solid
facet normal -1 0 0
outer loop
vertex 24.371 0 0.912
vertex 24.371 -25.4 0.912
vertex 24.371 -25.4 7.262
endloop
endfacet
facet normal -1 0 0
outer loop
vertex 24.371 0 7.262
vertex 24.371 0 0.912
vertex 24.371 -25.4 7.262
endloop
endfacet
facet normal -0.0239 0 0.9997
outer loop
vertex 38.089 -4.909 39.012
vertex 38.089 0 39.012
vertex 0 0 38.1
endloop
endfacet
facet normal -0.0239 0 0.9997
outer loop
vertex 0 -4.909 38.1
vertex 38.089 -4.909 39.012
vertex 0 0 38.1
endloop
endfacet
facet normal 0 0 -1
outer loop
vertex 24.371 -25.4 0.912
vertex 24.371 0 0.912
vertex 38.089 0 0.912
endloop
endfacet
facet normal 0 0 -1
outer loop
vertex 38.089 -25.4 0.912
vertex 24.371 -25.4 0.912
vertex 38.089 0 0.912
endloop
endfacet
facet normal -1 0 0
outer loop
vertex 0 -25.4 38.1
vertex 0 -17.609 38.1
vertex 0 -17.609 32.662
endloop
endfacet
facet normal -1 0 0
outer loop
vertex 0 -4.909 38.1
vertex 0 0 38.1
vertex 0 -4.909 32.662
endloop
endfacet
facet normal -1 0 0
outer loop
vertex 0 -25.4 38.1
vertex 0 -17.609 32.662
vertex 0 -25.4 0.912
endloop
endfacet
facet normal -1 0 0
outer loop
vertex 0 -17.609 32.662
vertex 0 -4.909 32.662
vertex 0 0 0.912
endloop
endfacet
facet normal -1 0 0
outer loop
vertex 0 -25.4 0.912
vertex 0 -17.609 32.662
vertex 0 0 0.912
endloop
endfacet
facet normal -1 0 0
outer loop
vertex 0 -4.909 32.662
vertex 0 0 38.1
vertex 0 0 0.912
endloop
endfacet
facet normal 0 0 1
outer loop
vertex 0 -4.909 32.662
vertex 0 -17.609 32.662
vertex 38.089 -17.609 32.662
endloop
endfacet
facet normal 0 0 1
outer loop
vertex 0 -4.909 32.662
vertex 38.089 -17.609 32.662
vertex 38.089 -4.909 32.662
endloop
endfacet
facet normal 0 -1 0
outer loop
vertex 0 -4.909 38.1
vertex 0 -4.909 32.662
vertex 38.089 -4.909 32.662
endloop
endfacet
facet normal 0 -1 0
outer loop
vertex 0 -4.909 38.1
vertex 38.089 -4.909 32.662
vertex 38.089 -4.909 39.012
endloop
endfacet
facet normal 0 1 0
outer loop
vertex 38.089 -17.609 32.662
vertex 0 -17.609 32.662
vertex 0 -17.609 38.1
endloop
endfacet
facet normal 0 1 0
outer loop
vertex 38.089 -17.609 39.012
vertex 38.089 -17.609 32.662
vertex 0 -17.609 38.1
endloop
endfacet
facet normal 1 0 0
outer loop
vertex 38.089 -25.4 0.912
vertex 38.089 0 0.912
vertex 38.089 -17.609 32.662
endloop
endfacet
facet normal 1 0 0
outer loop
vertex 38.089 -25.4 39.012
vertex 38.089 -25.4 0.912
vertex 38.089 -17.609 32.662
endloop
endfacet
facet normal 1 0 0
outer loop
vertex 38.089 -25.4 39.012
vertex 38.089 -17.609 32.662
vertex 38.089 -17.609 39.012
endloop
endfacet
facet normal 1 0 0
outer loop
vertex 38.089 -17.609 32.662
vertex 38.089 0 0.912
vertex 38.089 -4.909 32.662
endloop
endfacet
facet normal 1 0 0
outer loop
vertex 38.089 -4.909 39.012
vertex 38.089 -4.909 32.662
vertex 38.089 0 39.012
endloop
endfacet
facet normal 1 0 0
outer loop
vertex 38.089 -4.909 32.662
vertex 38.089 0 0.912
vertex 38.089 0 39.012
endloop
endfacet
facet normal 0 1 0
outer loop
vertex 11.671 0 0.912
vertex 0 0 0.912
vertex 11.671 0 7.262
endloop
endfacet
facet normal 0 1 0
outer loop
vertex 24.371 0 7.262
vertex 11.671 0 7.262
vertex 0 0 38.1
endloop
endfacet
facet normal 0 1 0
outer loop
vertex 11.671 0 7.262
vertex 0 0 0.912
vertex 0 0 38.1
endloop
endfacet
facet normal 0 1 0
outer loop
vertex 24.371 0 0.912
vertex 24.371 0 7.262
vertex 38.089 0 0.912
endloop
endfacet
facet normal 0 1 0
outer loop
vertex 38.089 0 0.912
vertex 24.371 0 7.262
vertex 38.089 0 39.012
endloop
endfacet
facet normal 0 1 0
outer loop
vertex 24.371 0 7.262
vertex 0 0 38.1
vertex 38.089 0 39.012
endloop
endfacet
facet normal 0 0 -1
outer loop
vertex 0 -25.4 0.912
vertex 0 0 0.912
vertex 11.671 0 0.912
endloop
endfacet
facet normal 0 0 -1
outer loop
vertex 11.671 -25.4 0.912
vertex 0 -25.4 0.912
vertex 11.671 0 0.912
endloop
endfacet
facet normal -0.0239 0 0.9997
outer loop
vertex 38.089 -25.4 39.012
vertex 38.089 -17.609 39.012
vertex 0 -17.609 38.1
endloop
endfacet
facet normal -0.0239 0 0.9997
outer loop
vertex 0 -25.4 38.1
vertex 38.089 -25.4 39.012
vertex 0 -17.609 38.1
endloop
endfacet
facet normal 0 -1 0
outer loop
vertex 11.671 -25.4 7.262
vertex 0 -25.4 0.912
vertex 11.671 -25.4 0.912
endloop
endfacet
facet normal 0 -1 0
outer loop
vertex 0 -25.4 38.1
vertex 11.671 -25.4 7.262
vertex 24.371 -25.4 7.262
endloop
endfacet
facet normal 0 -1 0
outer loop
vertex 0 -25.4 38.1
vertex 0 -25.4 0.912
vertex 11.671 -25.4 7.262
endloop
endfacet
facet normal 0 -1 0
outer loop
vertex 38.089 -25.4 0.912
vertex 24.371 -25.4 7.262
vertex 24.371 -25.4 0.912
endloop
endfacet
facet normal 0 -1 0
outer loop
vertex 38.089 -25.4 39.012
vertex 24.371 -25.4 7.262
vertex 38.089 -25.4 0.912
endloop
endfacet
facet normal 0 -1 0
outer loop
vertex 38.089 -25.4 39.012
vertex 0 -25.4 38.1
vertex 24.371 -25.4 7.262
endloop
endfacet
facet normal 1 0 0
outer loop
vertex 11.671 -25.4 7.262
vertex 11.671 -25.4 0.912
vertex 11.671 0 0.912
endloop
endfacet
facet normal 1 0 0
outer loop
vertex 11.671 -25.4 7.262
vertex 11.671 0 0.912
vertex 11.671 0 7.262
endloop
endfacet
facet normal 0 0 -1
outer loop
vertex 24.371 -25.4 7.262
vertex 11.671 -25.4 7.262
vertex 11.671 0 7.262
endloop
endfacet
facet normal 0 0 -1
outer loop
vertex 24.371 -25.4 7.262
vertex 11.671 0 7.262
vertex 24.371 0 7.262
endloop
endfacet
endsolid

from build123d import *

# Parameters (mm, degrees)
F1_DEPTH = 25.4
F2_W     = 12.7
F2_H     = 6.35
F3_DEPTH = 25.401
F4_W     = 12.7
F4_H     = 6.35
F5_DEPTH = 38.090076


with BuildPart() as f1:
    # F0 (on Front) → F1 (new body)
    with BuildSketch(Plane.XZ):
        Polygon((38.089076, 39.012315), (0, 38.1), (0, 0.912315), (38.089076, 0.912315), align=None)
    extrude(amount=F1_DEPTH)

    # F2 (on face) → F3 (cut, through all)
    with BuildSketch(Plane.XZ.offset(25.4)):
        with Locations((18.020797, 4.087315)):
            Rectangle(F2_W, F2_H)
    extrude(amount=-F3_DEPTH, mode=Mode.SUBTRACT)

    # F4 (on face) → F5 (cut, through all)
    with BuildSketch(Plane.YZ.offset(38.089076)):
        with Locations((-11.259039, 35.837315)):
            Rectangle(F4_W, F4_H)
    extrude(amount=-F5_DEPTH, mode=Mode.SUBTRACT)


solid = f1.part
